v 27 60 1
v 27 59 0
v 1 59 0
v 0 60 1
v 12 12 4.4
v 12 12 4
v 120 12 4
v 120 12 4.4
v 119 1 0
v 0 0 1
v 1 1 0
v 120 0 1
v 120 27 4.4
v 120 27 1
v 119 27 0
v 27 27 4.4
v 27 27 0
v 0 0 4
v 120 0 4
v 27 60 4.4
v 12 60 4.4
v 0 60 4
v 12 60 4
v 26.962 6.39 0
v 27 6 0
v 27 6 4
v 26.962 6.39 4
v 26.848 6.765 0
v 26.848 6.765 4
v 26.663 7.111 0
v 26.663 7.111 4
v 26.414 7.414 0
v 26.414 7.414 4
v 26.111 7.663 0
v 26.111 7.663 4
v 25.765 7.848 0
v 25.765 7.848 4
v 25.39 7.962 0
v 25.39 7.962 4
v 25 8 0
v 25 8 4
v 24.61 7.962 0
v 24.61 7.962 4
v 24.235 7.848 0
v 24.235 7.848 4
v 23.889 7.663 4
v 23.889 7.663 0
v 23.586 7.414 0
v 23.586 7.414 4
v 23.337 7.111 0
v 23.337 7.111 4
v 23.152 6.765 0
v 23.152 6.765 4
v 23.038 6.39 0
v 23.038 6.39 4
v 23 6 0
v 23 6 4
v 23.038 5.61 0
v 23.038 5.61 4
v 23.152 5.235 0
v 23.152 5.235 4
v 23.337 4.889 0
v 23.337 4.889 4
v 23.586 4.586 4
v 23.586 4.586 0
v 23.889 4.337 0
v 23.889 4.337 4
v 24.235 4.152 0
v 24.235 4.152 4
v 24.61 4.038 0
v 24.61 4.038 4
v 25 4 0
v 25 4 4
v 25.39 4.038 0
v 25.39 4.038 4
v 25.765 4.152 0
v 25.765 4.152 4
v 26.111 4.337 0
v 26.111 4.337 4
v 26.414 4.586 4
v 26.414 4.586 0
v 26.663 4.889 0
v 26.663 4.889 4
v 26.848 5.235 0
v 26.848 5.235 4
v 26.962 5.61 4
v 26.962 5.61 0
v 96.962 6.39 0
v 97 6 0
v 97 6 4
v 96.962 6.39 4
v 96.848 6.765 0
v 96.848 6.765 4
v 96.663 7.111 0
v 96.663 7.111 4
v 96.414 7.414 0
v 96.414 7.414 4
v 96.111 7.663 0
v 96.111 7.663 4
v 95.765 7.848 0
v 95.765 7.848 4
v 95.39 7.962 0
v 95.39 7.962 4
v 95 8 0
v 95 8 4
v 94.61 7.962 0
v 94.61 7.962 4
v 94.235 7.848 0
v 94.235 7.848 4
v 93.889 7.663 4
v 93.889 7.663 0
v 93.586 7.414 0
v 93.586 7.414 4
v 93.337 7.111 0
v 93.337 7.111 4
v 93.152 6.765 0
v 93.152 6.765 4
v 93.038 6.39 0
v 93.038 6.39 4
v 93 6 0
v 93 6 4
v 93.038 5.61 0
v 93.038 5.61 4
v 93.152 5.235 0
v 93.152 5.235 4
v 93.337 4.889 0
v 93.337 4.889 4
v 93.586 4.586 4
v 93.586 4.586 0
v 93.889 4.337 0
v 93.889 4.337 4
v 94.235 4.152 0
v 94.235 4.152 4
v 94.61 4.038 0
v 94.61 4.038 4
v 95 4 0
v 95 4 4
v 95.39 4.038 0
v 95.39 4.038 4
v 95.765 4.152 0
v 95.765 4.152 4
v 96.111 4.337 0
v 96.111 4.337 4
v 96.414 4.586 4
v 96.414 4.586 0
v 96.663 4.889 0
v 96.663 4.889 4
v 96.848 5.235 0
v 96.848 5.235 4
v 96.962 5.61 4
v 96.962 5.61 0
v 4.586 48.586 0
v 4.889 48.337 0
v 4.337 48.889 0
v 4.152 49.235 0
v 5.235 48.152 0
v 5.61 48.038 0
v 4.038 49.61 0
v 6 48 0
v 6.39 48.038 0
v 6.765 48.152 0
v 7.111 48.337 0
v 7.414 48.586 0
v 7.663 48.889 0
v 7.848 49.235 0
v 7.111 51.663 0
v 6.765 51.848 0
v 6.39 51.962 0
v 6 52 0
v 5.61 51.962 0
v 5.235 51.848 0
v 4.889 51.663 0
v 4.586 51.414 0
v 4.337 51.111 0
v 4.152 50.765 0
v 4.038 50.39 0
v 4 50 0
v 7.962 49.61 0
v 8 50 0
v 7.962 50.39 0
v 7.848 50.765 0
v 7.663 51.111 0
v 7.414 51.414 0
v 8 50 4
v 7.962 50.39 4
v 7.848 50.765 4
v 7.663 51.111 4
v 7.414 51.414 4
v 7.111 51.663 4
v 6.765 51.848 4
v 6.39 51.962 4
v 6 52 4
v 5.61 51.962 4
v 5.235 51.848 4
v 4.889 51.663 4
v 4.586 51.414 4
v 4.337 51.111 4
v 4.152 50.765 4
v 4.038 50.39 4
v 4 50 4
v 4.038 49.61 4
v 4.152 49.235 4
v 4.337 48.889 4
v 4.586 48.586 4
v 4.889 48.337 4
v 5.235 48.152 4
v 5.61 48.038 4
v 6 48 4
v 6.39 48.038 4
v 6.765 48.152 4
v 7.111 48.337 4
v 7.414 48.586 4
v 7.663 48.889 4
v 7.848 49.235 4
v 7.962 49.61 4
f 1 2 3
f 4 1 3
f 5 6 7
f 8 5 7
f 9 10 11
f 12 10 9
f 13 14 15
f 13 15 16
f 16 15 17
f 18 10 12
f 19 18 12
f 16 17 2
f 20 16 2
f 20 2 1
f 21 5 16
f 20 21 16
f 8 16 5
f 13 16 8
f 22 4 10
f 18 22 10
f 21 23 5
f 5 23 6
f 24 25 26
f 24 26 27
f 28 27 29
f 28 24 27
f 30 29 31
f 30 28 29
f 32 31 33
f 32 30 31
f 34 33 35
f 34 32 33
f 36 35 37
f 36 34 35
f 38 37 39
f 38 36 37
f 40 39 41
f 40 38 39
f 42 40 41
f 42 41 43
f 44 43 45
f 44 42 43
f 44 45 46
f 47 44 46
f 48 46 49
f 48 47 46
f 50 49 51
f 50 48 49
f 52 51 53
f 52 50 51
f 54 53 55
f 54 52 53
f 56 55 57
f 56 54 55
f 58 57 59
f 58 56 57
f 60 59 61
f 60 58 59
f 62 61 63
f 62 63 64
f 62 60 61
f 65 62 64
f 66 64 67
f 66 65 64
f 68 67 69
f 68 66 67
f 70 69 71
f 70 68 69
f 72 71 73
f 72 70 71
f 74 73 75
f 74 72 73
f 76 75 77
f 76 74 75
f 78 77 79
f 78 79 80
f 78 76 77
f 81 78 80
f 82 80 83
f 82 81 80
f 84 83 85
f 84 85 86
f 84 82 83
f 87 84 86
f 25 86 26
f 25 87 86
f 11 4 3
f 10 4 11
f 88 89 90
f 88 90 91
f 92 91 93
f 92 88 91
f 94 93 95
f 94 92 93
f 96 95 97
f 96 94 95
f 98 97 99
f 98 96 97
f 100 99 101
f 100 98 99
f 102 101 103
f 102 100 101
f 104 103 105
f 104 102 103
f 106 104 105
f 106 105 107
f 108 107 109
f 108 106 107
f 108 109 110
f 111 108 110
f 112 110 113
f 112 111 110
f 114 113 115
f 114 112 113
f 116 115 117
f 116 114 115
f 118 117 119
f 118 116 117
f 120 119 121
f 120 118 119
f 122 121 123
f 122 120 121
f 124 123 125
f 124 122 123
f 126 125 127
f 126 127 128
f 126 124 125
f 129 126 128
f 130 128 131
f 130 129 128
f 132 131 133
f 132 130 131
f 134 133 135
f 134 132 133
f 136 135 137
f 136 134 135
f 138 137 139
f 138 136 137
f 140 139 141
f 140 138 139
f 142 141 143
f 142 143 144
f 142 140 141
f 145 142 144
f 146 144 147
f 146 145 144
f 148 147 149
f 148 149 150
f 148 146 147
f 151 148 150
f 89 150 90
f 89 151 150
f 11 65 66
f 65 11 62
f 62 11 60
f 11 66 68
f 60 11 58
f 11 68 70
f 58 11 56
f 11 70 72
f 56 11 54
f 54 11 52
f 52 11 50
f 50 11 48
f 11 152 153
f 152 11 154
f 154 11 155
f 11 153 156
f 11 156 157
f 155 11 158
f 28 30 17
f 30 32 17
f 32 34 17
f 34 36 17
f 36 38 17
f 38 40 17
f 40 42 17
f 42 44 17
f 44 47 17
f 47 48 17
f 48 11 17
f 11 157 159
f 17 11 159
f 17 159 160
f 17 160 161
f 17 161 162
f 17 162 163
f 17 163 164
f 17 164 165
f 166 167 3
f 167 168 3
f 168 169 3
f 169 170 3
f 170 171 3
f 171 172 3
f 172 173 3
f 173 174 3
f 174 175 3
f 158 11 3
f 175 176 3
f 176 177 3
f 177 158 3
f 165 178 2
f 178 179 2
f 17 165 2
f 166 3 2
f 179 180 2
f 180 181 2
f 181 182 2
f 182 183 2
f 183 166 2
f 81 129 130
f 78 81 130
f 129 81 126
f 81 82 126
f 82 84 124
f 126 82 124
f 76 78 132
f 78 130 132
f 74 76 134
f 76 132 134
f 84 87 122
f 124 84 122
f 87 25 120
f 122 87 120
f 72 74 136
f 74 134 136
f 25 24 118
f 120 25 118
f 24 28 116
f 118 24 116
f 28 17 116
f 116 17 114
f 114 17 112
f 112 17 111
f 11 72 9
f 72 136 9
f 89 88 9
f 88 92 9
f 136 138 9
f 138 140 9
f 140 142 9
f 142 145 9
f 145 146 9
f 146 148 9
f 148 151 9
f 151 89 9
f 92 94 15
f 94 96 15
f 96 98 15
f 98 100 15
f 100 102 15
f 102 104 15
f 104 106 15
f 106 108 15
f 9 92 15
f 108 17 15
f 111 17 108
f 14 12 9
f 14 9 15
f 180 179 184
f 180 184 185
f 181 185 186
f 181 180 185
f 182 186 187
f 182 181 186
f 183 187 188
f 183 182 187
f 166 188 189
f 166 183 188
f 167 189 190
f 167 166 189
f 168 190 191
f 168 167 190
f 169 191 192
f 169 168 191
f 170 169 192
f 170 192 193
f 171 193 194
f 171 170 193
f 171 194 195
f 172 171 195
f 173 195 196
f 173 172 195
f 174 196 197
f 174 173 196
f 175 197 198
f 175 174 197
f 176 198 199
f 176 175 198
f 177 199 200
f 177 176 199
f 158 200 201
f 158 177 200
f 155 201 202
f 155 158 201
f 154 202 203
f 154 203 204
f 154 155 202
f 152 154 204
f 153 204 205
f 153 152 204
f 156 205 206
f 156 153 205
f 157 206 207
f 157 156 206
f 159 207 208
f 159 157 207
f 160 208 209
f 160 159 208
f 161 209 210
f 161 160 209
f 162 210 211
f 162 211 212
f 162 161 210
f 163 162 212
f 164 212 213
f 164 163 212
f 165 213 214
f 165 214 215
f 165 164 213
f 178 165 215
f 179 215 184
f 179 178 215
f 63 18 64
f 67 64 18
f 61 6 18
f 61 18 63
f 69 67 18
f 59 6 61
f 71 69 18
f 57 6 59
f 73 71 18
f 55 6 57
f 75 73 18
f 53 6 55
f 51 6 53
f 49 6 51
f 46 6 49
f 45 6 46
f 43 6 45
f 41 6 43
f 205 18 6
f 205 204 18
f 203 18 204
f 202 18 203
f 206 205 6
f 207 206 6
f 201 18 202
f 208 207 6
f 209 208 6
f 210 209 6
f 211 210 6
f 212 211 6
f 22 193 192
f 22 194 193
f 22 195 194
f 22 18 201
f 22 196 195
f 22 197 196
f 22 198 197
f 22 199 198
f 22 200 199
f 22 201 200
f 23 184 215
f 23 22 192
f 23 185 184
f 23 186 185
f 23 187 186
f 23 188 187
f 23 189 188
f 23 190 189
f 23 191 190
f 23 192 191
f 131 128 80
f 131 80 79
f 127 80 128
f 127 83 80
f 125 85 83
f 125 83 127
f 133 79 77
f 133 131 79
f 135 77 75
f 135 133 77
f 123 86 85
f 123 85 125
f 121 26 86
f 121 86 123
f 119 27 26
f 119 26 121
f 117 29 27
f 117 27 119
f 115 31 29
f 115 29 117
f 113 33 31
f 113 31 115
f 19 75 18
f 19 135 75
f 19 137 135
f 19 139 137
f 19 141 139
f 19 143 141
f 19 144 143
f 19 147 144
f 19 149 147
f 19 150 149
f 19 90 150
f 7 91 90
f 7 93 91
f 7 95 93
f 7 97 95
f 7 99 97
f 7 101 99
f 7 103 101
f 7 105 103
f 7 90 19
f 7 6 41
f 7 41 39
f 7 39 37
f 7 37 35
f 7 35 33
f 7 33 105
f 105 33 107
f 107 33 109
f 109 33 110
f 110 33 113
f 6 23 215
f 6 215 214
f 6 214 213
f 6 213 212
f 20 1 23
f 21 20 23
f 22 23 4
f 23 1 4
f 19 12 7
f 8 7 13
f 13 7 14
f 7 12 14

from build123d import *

# Parameters (mm, degrees)
F0_R     = 2
F1_DEPTH = 4
F3_DEPTH = 0.4
F4_SIZE  = 1


with BuildPart() as f1:
    # F0 (on Top) → F1 (new body)
    with BuildSketch(Plane.XY):
        Polygon((12, 12), (120, 12), (120, 27), (27, 27), (27, 60), (12, 60), align=None)
        Polygon((0, 60), (0, 0), (120, 0), (120, 12), (12, 12), (12, 60), align=None)
        with Locations((25, 6)):
            Circle(F0_R, mode=Mode.SUBTRACT)
        with Locations((95, 6)):
            Circle(F0_R, mode=Mode.SUBTRACT)
        with Locations((6, 50)):
            Circle(F0_R, mode=Mode.SUBTRACT)
    extrude(amount=F1_DEPTH)

    # F2 (on face) → F3 (join)
    with BuildSketch(Plane.XY.offset(4)):
        Polygon((27, 60), (12, 60), (12, 12), (120, 12), (120, 27), (27, 27), align=None)
    extrude(amount=F3_DEPTH)

    # F4
    f4_edges = [f1.edges().sort_by_distance(p)[0] for p in [
        (120, 13.5, 0),
        (13.5, 60, 0),
        (60, 0, 0),
        (0, 30, 0),
    ]]
    chamfer(f4_edges, length=F4_SIZE)


solid = f1.part
